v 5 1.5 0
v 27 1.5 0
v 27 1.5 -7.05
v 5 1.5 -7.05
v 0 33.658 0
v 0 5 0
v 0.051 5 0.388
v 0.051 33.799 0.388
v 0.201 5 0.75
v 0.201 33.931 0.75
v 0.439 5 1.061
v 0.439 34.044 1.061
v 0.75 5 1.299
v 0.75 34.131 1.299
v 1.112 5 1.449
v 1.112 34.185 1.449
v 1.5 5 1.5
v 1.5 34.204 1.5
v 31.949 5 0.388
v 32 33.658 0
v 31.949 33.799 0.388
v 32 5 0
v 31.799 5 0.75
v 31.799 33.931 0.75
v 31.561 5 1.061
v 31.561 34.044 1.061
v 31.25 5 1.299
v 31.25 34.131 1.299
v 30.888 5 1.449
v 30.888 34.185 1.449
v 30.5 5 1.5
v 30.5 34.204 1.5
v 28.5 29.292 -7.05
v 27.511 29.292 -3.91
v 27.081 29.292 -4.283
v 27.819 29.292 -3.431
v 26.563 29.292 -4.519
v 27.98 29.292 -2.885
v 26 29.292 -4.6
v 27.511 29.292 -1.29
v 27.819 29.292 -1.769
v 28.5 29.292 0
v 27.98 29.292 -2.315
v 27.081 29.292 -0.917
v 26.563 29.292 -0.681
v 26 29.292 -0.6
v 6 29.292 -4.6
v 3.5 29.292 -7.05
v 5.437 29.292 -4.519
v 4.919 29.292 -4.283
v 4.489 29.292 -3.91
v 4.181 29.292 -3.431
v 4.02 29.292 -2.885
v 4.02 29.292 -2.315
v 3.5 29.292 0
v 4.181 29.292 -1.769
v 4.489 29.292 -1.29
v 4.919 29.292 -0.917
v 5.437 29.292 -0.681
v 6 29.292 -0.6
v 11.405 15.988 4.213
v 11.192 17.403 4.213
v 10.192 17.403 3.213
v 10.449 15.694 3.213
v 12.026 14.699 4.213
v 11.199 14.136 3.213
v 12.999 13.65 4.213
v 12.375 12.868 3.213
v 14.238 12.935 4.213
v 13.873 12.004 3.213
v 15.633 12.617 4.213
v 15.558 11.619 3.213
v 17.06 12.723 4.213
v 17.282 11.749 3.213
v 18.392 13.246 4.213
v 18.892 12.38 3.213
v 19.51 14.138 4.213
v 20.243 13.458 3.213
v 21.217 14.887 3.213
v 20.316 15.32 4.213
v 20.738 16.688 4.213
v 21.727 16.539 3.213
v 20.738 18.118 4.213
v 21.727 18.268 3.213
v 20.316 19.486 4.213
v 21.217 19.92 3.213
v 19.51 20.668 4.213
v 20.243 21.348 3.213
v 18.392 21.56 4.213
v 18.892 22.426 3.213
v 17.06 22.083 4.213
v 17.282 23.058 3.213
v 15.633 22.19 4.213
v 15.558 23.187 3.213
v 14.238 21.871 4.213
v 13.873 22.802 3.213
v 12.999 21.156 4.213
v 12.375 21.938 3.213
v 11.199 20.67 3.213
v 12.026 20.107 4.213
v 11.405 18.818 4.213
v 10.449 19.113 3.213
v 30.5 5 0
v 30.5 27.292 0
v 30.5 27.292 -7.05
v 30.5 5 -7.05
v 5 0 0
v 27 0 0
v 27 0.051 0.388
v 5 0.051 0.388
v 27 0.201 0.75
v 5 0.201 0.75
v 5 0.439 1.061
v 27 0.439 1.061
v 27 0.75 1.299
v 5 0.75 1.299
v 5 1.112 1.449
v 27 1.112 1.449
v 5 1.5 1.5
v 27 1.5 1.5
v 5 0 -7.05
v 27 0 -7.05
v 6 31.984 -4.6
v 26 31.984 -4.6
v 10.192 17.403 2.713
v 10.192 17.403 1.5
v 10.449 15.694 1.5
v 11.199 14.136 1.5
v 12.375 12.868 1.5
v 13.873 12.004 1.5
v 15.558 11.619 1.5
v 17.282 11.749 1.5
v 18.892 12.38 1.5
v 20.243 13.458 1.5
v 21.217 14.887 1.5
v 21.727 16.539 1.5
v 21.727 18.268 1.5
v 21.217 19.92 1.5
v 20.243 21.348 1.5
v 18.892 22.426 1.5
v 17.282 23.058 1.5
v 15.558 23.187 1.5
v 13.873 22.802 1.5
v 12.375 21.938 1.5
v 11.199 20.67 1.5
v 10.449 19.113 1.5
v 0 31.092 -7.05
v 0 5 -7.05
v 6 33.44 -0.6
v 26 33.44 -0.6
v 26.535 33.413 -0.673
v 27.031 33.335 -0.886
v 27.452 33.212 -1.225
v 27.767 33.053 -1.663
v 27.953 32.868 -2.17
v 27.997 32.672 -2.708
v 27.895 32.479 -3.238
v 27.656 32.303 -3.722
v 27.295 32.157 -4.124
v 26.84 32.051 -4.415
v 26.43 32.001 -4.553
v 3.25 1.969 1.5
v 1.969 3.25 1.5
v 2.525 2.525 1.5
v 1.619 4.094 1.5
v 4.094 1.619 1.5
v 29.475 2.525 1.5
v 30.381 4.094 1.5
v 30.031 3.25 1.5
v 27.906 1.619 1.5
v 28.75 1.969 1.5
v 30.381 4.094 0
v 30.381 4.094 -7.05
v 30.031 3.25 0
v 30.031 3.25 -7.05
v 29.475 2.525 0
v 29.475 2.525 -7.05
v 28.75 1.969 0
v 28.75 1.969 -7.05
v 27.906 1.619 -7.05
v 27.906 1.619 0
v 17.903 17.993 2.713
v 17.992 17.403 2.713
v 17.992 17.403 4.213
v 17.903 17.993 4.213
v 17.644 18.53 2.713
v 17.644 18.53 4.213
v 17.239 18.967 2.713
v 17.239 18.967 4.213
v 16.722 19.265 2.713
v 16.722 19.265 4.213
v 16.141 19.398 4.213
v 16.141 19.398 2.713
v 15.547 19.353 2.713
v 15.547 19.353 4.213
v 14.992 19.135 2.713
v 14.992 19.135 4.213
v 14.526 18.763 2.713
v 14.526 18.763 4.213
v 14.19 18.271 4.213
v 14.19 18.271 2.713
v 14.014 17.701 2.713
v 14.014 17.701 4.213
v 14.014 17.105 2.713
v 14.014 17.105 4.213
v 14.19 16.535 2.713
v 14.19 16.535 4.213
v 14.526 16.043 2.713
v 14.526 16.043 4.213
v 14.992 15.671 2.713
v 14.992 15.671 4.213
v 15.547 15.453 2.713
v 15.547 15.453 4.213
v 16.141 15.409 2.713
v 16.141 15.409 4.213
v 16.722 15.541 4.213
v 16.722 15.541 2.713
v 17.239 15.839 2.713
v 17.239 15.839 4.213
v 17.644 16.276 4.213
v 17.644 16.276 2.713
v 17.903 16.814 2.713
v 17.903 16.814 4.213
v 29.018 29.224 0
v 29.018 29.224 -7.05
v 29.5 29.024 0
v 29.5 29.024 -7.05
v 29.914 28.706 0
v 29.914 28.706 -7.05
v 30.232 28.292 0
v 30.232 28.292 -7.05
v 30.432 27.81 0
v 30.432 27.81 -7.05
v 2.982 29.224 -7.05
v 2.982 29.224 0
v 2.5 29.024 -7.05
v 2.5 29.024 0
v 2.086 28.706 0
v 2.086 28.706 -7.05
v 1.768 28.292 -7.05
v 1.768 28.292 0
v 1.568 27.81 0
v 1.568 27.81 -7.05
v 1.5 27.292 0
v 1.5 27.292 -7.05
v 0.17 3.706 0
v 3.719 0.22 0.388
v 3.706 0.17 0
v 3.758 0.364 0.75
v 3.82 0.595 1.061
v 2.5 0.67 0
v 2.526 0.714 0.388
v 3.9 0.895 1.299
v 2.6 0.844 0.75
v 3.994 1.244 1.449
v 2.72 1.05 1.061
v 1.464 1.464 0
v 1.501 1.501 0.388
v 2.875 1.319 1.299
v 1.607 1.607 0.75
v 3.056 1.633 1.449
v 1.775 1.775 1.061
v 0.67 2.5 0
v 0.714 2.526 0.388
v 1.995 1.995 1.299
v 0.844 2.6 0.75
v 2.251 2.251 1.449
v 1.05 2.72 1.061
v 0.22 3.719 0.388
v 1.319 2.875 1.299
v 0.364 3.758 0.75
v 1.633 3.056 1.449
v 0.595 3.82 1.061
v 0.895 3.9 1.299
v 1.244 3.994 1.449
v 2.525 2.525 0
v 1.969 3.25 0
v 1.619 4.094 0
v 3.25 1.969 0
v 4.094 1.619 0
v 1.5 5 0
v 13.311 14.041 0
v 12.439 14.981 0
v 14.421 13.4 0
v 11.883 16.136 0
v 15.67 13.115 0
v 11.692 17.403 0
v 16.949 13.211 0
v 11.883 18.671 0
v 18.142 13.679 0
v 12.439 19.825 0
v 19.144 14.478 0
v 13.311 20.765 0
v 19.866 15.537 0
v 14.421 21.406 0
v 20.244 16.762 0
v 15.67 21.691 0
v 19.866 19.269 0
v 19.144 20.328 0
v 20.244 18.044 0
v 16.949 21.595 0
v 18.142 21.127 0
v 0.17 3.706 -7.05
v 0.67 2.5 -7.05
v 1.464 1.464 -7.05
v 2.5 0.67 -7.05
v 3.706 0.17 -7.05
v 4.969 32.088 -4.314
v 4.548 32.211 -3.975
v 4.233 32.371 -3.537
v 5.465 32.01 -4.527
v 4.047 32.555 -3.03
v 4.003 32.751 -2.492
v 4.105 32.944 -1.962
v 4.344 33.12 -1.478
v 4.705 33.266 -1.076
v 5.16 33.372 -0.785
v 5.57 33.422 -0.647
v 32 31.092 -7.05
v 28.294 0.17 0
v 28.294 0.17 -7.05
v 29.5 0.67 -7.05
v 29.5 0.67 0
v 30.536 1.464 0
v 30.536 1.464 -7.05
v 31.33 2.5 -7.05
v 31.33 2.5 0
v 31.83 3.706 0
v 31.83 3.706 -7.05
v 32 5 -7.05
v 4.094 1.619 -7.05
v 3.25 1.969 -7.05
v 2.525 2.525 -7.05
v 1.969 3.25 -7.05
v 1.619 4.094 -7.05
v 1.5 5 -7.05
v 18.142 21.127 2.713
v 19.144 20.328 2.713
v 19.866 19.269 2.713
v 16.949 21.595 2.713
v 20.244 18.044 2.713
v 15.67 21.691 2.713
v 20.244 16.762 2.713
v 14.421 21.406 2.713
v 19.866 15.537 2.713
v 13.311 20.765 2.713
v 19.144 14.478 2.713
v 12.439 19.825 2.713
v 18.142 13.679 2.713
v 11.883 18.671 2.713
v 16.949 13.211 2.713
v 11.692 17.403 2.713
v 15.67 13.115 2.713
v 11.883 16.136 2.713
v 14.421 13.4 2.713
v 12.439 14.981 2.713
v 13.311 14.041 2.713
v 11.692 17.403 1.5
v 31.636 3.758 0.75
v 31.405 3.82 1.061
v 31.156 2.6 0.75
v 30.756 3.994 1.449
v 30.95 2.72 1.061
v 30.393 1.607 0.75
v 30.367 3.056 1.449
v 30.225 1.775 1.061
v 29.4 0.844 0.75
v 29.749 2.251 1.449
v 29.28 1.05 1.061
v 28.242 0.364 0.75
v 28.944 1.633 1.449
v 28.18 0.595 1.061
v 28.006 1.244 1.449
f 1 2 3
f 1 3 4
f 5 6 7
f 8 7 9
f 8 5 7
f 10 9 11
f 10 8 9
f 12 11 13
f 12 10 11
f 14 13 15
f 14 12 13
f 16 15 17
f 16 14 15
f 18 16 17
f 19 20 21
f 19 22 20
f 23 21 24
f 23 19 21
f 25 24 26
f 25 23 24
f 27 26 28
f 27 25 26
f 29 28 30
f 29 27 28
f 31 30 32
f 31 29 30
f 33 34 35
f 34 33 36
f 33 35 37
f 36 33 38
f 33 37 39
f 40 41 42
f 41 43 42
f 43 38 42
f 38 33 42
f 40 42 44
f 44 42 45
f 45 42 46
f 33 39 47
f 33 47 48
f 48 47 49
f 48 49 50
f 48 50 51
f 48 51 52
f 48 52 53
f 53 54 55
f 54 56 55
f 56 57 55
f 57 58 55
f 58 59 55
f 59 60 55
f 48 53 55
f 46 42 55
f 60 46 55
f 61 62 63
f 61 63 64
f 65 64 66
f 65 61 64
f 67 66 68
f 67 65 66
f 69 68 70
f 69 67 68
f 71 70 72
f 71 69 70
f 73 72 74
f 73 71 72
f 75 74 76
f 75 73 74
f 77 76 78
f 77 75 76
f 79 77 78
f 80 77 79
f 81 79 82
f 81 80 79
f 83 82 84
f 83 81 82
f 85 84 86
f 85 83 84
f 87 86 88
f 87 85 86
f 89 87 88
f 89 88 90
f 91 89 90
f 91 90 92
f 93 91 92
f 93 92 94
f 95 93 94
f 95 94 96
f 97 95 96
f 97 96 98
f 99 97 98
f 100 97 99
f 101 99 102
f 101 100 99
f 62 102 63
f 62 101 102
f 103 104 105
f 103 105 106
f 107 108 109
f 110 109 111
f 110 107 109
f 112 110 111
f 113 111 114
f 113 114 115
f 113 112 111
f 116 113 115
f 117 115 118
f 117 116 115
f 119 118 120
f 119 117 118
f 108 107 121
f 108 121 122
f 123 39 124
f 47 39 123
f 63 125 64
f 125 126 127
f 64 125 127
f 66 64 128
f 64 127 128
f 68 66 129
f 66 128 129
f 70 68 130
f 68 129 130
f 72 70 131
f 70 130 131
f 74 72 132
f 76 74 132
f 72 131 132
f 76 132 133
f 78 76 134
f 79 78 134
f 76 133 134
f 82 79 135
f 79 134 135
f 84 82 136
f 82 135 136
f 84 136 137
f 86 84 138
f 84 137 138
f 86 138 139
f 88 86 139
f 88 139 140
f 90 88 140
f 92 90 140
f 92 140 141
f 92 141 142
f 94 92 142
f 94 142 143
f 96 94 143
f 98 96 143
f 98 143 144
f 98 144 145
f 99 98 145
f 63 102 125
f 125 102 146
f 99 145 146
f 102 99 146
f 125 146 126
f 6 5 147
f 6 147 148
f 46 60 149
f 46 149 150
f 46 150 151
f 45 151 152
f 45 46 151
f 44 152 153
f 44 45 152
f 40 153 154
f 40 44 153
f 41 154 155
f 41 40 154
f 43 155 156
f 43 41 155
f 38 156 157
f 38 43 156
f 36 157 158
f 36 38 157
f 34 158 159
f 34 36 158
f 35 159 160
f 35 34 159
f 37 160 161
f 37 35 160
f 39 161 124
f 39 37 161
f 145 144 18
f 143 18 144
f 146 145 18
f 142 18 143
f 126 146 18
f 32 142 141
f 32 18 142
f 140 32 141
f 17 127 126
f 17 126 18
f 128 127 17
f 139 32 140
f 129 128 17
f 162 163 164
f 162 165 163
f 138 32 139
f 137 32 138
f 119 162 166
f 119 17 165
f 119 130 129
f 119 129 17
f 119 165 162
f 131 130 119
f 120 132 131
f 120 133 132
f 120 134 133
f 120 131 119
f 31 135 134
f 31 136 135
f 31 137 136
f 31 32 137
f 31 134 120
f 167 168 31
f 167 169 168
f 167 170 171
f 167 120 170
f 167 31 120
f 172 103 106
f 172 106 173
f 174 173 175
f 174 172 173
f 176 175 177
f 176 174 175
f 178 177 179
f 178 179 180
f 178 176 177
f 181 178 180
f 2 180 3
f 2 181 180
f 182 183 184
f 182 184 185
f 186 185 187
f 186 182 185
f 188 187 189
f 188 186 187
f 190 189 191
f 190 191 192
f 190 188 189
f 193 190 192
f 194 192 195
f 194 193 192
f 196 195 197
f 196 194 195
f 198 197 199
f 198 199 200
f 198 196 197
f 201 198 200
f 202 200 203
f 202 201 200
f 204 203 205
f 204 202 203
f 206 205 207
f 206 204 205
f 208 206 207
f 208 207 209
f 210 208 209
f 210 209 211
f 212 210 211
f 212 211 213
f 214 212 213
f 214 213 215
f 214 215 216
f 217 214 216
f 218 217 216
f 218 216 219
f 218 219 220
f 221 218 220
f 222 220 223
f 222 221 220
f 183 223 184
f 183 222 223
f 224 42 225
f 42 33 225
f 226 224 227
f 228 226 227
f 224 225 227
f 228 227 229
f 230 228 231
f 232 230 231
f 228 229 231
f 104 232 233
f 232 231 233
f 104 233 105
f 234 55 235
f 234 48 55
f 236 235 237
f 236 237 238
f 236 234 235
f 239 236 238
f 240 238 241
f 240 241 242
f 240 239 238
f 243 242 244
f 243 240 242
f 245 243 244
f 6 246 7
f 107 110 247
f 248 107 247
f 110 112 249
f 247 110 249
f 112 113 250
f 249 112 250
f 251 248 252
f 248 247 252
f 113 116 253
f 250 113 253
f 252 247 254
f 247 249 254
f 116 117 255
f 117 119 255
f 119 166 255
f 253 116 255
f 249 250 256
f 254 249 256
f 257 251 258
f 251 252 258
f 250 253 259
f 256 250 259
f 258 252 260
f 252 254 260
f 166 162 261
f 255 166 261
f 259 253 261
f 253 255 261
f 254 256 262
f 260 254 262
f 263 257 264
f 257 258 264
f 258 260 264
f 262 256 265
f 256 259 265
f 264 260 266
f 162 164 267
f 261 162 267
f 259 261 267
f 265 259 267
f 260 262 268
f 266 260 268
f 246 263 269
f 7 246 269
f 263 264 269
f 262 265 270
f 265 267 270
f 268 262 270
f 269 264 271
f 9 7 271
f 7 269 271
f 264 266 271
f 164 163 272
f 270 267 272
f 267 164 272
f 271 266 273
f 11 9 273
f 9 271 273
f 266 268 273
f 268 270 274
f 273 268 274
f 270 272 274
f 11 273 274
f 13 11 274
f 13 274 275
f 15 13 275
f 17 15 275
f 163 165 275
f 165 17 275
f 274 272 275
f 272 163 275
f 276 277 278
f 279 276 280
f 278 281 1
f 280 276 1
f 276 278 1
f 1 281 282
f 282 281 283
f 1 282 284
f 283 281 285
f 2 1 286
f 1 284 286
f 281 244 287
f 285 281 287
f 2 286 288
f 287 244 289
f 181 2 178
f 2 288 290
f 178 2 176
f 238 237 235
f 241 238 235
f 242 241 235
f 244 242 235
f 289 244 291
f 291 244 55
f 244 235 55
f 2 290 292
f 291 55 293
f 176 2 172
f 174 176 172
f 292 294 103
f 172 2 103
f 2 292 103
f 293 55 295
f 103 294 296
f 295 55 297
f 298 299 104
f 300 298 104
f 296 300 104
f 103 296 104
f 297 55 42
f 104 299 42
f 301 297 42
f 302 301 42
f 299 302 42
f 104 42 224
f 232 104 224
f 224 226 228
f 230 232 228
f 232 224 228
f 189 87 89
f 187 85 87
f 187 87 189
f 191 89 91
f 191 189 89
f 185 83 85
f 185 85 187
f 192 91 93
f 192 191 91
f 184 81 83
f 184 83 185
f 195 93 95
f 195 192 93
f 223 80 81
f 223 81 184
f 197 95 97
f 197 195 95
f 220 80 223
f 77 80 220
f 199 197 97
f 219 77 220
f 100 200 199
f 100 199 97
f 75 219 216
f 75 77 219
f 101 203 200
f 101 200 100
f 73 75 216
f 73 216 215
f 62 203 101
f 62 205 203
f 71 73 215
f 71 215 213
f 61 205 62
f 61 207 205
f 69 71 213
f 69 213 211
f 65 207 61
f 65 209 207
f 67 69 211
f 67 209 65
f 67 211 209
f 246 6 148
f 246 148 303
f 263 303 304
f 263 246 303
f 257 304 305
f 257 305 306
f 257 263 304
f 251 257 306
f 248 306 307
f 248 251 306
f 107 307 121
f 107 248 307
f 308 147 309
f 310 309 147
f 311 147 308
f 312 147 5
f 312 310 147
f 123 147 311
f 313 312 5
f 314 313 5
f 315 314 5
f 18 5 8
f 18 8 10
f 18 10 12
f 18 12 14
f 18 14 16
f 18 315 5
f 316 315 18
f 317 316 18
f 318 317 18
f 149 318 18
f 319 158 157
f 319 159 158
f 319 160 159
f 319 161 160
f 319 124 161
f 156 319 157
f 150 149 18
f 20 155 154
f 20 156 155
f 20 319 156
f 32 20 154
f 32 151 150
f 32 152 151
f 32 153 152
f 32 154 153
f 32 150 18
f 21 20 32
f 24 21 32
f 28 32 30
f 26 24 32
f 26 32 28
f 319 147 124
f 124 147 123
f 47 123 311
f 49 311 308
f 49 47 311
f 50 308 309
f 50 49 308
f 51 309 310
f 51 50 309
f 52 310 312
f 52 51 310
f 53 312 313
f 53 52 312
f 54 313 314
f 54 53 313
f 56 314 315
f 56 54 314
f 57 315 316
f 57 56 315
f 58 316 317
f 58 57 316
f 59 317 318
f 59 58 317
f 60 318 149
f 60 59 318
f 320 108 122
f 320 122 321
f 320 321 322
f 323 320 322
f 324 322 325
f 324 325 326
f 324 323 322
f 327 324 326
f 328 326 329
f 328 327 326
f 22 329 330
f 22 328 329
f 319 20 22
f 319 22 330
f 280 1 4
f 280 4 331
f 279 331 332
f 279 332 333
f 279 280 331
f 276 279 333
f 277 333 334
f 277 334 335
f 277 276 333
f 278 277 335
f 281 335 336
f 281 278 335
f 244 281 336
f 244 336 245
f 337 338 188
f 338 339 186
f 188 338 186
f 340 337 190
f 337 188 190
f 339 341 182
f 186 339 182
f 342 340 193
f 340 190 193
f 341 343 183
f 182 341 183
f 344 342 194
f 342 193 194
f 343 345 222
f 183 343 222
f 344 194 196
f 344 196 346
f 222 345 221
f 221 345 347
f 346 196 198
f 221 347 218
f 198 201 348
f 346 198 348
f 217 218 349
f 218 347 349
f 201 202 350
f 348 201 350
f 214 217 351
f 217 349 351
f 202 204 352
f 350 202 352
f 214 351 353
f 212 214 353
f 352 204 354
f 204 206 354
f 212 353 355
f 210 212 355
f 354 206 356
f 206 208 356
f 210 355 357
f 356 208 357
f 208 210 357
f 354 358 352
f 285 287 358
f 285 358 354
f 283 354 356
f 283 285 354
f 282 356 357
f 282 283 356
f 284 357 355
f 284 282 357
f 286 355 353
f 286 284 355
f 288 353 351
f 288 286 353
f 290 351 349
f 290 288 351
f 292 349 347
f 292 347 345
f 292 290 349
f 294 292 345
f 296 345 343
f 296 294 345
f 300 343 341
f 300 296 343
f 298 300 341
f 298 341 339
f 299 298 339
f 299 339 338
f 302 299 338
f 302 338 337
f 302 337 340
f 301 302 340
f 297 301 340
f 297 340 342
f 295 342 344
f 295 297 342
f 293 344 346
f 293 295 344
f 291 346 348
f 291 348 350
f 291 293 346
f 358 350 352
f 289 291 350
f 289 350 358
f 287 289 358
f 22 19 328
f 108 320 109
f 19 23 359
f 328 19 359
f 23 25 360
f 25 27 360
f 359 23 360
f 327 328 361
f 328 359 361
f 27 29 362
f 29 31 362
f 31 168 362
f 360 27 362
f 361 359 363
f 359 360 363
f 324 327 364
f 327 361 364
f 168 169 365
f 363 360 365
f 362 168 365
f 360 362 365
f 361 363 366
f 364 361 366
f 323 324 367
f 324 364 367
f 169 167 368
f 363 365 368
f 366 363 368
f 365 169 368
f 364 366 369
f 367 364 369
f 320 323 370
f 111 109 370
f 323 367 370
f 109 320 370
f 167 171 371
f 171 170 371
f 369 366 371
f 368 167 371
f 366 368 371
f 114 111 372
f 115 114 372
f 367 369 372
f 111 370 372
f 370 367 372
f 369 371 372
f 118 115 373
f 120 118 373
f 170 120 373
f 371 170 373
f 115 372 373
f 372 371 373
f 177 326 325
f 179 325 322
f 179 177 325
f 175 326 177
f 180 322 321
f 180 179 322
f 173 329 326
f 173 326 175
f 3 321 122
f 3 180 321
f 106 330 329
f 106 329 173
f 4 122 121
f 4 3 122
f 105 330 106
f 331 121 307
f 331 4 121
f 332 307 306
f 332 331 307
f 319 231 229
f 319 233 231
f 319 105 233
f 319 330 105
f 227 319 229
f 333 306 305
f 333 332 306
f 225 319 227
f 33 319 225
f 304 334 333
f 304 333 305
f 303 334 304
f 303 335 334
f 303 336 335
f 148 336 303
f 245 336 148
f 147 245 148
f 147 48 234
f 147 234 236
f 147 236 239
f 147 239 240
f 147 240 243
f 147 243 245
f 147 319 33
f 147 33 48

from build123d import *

# Parameters (mm, degrees)
SKETCH1_W           = 32
SKETCH1_H           = 31.091910702798558
BOSS_EXTRUDE1_DEPTH = 1.5
FILLET1_R           = 5
SKETCH2_R           = 4.3000000000159515
CUT_EXTRUDE1_DEPTH  = 45.642545975233084
SKETCH3_R           = 5.79999999998862
SKETCH3_R_2         = 4.299999999994187
BOSS_EXTRUDE2_DEPTH = 1.212999868
SKETCH4_R           = 5.799999999994187
SKETCH4_R_2         = 1.9999999999941904
BOSS_EXTRUDE3_DEPTH = 1.5
CHAMFER1_SIZE       = 1
EXTRUDE_THIN1_DEPTH = 7.05
BOSS_EXTRUDE4_REACH = 47.171
SKETCH7_W           = 29.000000000000004
SKETCH7_H           = 1.8000000000000007
BOSS_EXTRUDE5_DEPTH = 7.05
FILLET2_R           = 2
CUT_EXTRUDE2_DEPTH  = 10
FILLET3_R           = 1.5


with BuildPart() as part:
    # Sketch1 → Boss-Extrude1 (new body)
    with BuildSketch(Plane.XY):
        with Locations((16, 15.545955351399279)):
            Rectangle(SKETCH1_W, SKETCH1_H)
    extrude(amount=BOSS_EXTRUDE1_DEPTH)

    # Fillet1
    fillet1_edges = [part.edges().sort_by_distance(p)[0] for p in [
        (32, 0, 0.75),
        (0, 0, 0.75),
    ]]
    fillet(fillet1_edges, radius=FILLET1_R)

    # Sketch2 → Cut-Extrude1 (cut, through all)
    with BuildSketch(Plane(origin=(0, 0, 0), x_dir=(-1, 0, 0), z_dir=(0, 0, -1))):
        with Locations((-15.991678414180004, 17.403095514898066)):
            Circle(SKETCH2_R)
    extrude(amount=-CUT_EXTRUDE1_DEPTH, mode=Mode.SUBTRACT)

    # Sketch3 → Boss-Extrude2 (add)
    with BuildSketch(Plane.XY.offset(1.5)):
        with Locations(Location((15.991678414180004, 17.403095514898066, 0), (0, 0, 180))):
            Circle(SKETCH3_R)
        with Locations(Location((15.991678414180004, 17.403095514898066, 0), (0, 0, 180))):
            Circle(SKETCH3_R_2, mode=Mode.SUBTRACT)
    extrude(amount=BOSS_EXTRUDE2_DEPTH)

    # Sketch4 → Boss-Extrude3 (add)
    with BuildSketch(Plane.XY.offset(2.7129998678795)):
        with Locations(Location((15.991678414180004, 17.403095514898066, 0), (0, 0, 180))):
            Circle(SKETCH4_R)
        with Locations((15.991678414180004, 17.403095514898066)):
            Circle(SKETCH4_R_2, mode=Mode.SUBTRACT)
    extrude(amount=BOSS_EXTRUDE3_DEPTH)

    # Chamfer1
    chamfer1_edges = [part.edges().sort_by_distance(p)[0] for p in [
        (21.791678414174193, 17.403095514898062, 4.2129998678795),
    ]]
    chamfer(chamfer1_edges, length=CHAMFER1_SIZE)

    # Sketch5 → Extrude-Thin1 (add)
    with BuildSketch(Plane(origin=(0, 0, 0), x_dir=(-1, 0, 0), z_dir=(0, 0, -1))):
        with BuildLine():
            Line((0, 31.091910702798558), (0, 4.999999999999998))
            ThreePointArc((0, 4.999999999999998), (-1.4644660940672622, 1.4644660940672614), (-5, 0))
            Line((-5, 0), (-27, 0))
            ThreePointArc((-27, 0), (-30.535533905932738, 1.4644660940672654), (-32, 4.999999999999998))
            Line((-32, 4.999999999999998), (-32, 31.091910702798558))
            Line((-32, 31.091910702798558), (-30.5, 31.091910702798558))
            Line((-30.5, 31.091910702798558), (-30.5, 4.999999999999998))
            ThreePointArc((-30.5, 4.999999999999996), (-29.47487373415292, 2.5251262658470903), (-27.00000000000001, 1.5000000000000067))
            Line((-27, 1.5), (-5, 1.5))
            ThreePointArc((-4.999999999999999, 1.5), (-2.525126265847083, 2.5251262658470828), (-1.4999999999999996, 4.999999999999998))
            Line((-1.5, 4.999999999999998), (-1.5, 31.091910702798558))
            Line((-1.5, 31.091910702798558), (0, 31.091910702798558))
        make_face()
    extrude(amount=EXTRUDE_THIN1_DEPTH)

    # Boss-Extrude4: up to this face of the body (flat: up to its plane)
    boss_extrude4_end = Plane(part.part.faces().sort_by_distance((0, 18.045955351, -2.775))[0])
    # Sketch6 → Boss-Extrude4 (add, up to the picked face)
    with BuildSketch(Plane(origin=(32, 0, 0), x_dir=(0, 0, -1), z_dir=(1, 0, 0)), mode=Mode.PRIVATE) as boss_extrude4_sk1:
        Polygon((7.050000000000448, 31.09191070279875), (-1.4999999999999993, 34.20385620577456), (-1.5, 31.091910702798558), align=None)
    boss_extrude4_tool1 = split(extrude(boss_extrude4_sk1.sketch, amount=-BOSS_EXTRUDE4_REACH, mode=Mode.PRIVATE), bisect_by=boss_extrude4_end, keep=Keep.BOTH, mode=Mode.PRIVATE)
    add(boss_extrude4_tool1.solids().sort_by(Axis((32, 32.129226, -1.35), (-1, 0, 0)))[0])

    # Sketch7 → Boss-Extrude5 (add)
    with BuildSketch(Plane(origin=(0, 0, 0), x_dir=(-1, 0, 0), z_dir=(0, 0, -1))):
        with Locations((-16, 30.19191070279856)):
            Rectangle(SKETCH7_W, SKETCH7_H)
    extrude(amount=BOSS_EXTRUDE5_DEPTH)

    # Fillet2
    fillet2_edges = [part.edges().sort_by_distance(p)[0] for p in [
        (30.5, 29.291910702798557, -3.525),
        (1.5, 29.291910702798557, -3.525),
    ]]
    fillet(fillet2_edges, radius=FILLET2_R)

    # Sketch8 → Cut-Extrude2 (cut)
    with BuildSketch(Plane.XZ.offset(-29.291910702798557)):
        with BuildLine():
            Line((26, -4.600000000000001), (6.000000000000002, -4.600000000000004))
            ThreePointArc((6.000000000000002, -4.600000000000004), (3.9999999999999996, -2.600000000000004), (6.000000000000001, -0.6000000000000024))
            Line((6.000000000000001, -0.6000000000000024), (26, -0.6))
            ThreePointArc((26, -0.6), (28, -2.600000000000002), (26, -4.600000000000001))
        make_face()
    extrude(amount=-CUT_EXTRUDE2_DEPTH, mode=Mode.SUBTRACT)

    # Fillet3
    fillet3_edges = [part.edges().sort_by_distance(p)[0] for p in [
        (32, 19.60192810288728, 1.4999999999999996),
        (16, 0, 1.5),
        (1.4644660940672618, 1.4644660940672614, 1.5),
        (30.535533905932738, 1.4644660940672618, 1.5),
        (-4.4e-16, 19.60192810288728, 1.4999999999999996),
    ]]
    fillet(fillet3_edges, radius=FILLET3_R)


solid = part.part
